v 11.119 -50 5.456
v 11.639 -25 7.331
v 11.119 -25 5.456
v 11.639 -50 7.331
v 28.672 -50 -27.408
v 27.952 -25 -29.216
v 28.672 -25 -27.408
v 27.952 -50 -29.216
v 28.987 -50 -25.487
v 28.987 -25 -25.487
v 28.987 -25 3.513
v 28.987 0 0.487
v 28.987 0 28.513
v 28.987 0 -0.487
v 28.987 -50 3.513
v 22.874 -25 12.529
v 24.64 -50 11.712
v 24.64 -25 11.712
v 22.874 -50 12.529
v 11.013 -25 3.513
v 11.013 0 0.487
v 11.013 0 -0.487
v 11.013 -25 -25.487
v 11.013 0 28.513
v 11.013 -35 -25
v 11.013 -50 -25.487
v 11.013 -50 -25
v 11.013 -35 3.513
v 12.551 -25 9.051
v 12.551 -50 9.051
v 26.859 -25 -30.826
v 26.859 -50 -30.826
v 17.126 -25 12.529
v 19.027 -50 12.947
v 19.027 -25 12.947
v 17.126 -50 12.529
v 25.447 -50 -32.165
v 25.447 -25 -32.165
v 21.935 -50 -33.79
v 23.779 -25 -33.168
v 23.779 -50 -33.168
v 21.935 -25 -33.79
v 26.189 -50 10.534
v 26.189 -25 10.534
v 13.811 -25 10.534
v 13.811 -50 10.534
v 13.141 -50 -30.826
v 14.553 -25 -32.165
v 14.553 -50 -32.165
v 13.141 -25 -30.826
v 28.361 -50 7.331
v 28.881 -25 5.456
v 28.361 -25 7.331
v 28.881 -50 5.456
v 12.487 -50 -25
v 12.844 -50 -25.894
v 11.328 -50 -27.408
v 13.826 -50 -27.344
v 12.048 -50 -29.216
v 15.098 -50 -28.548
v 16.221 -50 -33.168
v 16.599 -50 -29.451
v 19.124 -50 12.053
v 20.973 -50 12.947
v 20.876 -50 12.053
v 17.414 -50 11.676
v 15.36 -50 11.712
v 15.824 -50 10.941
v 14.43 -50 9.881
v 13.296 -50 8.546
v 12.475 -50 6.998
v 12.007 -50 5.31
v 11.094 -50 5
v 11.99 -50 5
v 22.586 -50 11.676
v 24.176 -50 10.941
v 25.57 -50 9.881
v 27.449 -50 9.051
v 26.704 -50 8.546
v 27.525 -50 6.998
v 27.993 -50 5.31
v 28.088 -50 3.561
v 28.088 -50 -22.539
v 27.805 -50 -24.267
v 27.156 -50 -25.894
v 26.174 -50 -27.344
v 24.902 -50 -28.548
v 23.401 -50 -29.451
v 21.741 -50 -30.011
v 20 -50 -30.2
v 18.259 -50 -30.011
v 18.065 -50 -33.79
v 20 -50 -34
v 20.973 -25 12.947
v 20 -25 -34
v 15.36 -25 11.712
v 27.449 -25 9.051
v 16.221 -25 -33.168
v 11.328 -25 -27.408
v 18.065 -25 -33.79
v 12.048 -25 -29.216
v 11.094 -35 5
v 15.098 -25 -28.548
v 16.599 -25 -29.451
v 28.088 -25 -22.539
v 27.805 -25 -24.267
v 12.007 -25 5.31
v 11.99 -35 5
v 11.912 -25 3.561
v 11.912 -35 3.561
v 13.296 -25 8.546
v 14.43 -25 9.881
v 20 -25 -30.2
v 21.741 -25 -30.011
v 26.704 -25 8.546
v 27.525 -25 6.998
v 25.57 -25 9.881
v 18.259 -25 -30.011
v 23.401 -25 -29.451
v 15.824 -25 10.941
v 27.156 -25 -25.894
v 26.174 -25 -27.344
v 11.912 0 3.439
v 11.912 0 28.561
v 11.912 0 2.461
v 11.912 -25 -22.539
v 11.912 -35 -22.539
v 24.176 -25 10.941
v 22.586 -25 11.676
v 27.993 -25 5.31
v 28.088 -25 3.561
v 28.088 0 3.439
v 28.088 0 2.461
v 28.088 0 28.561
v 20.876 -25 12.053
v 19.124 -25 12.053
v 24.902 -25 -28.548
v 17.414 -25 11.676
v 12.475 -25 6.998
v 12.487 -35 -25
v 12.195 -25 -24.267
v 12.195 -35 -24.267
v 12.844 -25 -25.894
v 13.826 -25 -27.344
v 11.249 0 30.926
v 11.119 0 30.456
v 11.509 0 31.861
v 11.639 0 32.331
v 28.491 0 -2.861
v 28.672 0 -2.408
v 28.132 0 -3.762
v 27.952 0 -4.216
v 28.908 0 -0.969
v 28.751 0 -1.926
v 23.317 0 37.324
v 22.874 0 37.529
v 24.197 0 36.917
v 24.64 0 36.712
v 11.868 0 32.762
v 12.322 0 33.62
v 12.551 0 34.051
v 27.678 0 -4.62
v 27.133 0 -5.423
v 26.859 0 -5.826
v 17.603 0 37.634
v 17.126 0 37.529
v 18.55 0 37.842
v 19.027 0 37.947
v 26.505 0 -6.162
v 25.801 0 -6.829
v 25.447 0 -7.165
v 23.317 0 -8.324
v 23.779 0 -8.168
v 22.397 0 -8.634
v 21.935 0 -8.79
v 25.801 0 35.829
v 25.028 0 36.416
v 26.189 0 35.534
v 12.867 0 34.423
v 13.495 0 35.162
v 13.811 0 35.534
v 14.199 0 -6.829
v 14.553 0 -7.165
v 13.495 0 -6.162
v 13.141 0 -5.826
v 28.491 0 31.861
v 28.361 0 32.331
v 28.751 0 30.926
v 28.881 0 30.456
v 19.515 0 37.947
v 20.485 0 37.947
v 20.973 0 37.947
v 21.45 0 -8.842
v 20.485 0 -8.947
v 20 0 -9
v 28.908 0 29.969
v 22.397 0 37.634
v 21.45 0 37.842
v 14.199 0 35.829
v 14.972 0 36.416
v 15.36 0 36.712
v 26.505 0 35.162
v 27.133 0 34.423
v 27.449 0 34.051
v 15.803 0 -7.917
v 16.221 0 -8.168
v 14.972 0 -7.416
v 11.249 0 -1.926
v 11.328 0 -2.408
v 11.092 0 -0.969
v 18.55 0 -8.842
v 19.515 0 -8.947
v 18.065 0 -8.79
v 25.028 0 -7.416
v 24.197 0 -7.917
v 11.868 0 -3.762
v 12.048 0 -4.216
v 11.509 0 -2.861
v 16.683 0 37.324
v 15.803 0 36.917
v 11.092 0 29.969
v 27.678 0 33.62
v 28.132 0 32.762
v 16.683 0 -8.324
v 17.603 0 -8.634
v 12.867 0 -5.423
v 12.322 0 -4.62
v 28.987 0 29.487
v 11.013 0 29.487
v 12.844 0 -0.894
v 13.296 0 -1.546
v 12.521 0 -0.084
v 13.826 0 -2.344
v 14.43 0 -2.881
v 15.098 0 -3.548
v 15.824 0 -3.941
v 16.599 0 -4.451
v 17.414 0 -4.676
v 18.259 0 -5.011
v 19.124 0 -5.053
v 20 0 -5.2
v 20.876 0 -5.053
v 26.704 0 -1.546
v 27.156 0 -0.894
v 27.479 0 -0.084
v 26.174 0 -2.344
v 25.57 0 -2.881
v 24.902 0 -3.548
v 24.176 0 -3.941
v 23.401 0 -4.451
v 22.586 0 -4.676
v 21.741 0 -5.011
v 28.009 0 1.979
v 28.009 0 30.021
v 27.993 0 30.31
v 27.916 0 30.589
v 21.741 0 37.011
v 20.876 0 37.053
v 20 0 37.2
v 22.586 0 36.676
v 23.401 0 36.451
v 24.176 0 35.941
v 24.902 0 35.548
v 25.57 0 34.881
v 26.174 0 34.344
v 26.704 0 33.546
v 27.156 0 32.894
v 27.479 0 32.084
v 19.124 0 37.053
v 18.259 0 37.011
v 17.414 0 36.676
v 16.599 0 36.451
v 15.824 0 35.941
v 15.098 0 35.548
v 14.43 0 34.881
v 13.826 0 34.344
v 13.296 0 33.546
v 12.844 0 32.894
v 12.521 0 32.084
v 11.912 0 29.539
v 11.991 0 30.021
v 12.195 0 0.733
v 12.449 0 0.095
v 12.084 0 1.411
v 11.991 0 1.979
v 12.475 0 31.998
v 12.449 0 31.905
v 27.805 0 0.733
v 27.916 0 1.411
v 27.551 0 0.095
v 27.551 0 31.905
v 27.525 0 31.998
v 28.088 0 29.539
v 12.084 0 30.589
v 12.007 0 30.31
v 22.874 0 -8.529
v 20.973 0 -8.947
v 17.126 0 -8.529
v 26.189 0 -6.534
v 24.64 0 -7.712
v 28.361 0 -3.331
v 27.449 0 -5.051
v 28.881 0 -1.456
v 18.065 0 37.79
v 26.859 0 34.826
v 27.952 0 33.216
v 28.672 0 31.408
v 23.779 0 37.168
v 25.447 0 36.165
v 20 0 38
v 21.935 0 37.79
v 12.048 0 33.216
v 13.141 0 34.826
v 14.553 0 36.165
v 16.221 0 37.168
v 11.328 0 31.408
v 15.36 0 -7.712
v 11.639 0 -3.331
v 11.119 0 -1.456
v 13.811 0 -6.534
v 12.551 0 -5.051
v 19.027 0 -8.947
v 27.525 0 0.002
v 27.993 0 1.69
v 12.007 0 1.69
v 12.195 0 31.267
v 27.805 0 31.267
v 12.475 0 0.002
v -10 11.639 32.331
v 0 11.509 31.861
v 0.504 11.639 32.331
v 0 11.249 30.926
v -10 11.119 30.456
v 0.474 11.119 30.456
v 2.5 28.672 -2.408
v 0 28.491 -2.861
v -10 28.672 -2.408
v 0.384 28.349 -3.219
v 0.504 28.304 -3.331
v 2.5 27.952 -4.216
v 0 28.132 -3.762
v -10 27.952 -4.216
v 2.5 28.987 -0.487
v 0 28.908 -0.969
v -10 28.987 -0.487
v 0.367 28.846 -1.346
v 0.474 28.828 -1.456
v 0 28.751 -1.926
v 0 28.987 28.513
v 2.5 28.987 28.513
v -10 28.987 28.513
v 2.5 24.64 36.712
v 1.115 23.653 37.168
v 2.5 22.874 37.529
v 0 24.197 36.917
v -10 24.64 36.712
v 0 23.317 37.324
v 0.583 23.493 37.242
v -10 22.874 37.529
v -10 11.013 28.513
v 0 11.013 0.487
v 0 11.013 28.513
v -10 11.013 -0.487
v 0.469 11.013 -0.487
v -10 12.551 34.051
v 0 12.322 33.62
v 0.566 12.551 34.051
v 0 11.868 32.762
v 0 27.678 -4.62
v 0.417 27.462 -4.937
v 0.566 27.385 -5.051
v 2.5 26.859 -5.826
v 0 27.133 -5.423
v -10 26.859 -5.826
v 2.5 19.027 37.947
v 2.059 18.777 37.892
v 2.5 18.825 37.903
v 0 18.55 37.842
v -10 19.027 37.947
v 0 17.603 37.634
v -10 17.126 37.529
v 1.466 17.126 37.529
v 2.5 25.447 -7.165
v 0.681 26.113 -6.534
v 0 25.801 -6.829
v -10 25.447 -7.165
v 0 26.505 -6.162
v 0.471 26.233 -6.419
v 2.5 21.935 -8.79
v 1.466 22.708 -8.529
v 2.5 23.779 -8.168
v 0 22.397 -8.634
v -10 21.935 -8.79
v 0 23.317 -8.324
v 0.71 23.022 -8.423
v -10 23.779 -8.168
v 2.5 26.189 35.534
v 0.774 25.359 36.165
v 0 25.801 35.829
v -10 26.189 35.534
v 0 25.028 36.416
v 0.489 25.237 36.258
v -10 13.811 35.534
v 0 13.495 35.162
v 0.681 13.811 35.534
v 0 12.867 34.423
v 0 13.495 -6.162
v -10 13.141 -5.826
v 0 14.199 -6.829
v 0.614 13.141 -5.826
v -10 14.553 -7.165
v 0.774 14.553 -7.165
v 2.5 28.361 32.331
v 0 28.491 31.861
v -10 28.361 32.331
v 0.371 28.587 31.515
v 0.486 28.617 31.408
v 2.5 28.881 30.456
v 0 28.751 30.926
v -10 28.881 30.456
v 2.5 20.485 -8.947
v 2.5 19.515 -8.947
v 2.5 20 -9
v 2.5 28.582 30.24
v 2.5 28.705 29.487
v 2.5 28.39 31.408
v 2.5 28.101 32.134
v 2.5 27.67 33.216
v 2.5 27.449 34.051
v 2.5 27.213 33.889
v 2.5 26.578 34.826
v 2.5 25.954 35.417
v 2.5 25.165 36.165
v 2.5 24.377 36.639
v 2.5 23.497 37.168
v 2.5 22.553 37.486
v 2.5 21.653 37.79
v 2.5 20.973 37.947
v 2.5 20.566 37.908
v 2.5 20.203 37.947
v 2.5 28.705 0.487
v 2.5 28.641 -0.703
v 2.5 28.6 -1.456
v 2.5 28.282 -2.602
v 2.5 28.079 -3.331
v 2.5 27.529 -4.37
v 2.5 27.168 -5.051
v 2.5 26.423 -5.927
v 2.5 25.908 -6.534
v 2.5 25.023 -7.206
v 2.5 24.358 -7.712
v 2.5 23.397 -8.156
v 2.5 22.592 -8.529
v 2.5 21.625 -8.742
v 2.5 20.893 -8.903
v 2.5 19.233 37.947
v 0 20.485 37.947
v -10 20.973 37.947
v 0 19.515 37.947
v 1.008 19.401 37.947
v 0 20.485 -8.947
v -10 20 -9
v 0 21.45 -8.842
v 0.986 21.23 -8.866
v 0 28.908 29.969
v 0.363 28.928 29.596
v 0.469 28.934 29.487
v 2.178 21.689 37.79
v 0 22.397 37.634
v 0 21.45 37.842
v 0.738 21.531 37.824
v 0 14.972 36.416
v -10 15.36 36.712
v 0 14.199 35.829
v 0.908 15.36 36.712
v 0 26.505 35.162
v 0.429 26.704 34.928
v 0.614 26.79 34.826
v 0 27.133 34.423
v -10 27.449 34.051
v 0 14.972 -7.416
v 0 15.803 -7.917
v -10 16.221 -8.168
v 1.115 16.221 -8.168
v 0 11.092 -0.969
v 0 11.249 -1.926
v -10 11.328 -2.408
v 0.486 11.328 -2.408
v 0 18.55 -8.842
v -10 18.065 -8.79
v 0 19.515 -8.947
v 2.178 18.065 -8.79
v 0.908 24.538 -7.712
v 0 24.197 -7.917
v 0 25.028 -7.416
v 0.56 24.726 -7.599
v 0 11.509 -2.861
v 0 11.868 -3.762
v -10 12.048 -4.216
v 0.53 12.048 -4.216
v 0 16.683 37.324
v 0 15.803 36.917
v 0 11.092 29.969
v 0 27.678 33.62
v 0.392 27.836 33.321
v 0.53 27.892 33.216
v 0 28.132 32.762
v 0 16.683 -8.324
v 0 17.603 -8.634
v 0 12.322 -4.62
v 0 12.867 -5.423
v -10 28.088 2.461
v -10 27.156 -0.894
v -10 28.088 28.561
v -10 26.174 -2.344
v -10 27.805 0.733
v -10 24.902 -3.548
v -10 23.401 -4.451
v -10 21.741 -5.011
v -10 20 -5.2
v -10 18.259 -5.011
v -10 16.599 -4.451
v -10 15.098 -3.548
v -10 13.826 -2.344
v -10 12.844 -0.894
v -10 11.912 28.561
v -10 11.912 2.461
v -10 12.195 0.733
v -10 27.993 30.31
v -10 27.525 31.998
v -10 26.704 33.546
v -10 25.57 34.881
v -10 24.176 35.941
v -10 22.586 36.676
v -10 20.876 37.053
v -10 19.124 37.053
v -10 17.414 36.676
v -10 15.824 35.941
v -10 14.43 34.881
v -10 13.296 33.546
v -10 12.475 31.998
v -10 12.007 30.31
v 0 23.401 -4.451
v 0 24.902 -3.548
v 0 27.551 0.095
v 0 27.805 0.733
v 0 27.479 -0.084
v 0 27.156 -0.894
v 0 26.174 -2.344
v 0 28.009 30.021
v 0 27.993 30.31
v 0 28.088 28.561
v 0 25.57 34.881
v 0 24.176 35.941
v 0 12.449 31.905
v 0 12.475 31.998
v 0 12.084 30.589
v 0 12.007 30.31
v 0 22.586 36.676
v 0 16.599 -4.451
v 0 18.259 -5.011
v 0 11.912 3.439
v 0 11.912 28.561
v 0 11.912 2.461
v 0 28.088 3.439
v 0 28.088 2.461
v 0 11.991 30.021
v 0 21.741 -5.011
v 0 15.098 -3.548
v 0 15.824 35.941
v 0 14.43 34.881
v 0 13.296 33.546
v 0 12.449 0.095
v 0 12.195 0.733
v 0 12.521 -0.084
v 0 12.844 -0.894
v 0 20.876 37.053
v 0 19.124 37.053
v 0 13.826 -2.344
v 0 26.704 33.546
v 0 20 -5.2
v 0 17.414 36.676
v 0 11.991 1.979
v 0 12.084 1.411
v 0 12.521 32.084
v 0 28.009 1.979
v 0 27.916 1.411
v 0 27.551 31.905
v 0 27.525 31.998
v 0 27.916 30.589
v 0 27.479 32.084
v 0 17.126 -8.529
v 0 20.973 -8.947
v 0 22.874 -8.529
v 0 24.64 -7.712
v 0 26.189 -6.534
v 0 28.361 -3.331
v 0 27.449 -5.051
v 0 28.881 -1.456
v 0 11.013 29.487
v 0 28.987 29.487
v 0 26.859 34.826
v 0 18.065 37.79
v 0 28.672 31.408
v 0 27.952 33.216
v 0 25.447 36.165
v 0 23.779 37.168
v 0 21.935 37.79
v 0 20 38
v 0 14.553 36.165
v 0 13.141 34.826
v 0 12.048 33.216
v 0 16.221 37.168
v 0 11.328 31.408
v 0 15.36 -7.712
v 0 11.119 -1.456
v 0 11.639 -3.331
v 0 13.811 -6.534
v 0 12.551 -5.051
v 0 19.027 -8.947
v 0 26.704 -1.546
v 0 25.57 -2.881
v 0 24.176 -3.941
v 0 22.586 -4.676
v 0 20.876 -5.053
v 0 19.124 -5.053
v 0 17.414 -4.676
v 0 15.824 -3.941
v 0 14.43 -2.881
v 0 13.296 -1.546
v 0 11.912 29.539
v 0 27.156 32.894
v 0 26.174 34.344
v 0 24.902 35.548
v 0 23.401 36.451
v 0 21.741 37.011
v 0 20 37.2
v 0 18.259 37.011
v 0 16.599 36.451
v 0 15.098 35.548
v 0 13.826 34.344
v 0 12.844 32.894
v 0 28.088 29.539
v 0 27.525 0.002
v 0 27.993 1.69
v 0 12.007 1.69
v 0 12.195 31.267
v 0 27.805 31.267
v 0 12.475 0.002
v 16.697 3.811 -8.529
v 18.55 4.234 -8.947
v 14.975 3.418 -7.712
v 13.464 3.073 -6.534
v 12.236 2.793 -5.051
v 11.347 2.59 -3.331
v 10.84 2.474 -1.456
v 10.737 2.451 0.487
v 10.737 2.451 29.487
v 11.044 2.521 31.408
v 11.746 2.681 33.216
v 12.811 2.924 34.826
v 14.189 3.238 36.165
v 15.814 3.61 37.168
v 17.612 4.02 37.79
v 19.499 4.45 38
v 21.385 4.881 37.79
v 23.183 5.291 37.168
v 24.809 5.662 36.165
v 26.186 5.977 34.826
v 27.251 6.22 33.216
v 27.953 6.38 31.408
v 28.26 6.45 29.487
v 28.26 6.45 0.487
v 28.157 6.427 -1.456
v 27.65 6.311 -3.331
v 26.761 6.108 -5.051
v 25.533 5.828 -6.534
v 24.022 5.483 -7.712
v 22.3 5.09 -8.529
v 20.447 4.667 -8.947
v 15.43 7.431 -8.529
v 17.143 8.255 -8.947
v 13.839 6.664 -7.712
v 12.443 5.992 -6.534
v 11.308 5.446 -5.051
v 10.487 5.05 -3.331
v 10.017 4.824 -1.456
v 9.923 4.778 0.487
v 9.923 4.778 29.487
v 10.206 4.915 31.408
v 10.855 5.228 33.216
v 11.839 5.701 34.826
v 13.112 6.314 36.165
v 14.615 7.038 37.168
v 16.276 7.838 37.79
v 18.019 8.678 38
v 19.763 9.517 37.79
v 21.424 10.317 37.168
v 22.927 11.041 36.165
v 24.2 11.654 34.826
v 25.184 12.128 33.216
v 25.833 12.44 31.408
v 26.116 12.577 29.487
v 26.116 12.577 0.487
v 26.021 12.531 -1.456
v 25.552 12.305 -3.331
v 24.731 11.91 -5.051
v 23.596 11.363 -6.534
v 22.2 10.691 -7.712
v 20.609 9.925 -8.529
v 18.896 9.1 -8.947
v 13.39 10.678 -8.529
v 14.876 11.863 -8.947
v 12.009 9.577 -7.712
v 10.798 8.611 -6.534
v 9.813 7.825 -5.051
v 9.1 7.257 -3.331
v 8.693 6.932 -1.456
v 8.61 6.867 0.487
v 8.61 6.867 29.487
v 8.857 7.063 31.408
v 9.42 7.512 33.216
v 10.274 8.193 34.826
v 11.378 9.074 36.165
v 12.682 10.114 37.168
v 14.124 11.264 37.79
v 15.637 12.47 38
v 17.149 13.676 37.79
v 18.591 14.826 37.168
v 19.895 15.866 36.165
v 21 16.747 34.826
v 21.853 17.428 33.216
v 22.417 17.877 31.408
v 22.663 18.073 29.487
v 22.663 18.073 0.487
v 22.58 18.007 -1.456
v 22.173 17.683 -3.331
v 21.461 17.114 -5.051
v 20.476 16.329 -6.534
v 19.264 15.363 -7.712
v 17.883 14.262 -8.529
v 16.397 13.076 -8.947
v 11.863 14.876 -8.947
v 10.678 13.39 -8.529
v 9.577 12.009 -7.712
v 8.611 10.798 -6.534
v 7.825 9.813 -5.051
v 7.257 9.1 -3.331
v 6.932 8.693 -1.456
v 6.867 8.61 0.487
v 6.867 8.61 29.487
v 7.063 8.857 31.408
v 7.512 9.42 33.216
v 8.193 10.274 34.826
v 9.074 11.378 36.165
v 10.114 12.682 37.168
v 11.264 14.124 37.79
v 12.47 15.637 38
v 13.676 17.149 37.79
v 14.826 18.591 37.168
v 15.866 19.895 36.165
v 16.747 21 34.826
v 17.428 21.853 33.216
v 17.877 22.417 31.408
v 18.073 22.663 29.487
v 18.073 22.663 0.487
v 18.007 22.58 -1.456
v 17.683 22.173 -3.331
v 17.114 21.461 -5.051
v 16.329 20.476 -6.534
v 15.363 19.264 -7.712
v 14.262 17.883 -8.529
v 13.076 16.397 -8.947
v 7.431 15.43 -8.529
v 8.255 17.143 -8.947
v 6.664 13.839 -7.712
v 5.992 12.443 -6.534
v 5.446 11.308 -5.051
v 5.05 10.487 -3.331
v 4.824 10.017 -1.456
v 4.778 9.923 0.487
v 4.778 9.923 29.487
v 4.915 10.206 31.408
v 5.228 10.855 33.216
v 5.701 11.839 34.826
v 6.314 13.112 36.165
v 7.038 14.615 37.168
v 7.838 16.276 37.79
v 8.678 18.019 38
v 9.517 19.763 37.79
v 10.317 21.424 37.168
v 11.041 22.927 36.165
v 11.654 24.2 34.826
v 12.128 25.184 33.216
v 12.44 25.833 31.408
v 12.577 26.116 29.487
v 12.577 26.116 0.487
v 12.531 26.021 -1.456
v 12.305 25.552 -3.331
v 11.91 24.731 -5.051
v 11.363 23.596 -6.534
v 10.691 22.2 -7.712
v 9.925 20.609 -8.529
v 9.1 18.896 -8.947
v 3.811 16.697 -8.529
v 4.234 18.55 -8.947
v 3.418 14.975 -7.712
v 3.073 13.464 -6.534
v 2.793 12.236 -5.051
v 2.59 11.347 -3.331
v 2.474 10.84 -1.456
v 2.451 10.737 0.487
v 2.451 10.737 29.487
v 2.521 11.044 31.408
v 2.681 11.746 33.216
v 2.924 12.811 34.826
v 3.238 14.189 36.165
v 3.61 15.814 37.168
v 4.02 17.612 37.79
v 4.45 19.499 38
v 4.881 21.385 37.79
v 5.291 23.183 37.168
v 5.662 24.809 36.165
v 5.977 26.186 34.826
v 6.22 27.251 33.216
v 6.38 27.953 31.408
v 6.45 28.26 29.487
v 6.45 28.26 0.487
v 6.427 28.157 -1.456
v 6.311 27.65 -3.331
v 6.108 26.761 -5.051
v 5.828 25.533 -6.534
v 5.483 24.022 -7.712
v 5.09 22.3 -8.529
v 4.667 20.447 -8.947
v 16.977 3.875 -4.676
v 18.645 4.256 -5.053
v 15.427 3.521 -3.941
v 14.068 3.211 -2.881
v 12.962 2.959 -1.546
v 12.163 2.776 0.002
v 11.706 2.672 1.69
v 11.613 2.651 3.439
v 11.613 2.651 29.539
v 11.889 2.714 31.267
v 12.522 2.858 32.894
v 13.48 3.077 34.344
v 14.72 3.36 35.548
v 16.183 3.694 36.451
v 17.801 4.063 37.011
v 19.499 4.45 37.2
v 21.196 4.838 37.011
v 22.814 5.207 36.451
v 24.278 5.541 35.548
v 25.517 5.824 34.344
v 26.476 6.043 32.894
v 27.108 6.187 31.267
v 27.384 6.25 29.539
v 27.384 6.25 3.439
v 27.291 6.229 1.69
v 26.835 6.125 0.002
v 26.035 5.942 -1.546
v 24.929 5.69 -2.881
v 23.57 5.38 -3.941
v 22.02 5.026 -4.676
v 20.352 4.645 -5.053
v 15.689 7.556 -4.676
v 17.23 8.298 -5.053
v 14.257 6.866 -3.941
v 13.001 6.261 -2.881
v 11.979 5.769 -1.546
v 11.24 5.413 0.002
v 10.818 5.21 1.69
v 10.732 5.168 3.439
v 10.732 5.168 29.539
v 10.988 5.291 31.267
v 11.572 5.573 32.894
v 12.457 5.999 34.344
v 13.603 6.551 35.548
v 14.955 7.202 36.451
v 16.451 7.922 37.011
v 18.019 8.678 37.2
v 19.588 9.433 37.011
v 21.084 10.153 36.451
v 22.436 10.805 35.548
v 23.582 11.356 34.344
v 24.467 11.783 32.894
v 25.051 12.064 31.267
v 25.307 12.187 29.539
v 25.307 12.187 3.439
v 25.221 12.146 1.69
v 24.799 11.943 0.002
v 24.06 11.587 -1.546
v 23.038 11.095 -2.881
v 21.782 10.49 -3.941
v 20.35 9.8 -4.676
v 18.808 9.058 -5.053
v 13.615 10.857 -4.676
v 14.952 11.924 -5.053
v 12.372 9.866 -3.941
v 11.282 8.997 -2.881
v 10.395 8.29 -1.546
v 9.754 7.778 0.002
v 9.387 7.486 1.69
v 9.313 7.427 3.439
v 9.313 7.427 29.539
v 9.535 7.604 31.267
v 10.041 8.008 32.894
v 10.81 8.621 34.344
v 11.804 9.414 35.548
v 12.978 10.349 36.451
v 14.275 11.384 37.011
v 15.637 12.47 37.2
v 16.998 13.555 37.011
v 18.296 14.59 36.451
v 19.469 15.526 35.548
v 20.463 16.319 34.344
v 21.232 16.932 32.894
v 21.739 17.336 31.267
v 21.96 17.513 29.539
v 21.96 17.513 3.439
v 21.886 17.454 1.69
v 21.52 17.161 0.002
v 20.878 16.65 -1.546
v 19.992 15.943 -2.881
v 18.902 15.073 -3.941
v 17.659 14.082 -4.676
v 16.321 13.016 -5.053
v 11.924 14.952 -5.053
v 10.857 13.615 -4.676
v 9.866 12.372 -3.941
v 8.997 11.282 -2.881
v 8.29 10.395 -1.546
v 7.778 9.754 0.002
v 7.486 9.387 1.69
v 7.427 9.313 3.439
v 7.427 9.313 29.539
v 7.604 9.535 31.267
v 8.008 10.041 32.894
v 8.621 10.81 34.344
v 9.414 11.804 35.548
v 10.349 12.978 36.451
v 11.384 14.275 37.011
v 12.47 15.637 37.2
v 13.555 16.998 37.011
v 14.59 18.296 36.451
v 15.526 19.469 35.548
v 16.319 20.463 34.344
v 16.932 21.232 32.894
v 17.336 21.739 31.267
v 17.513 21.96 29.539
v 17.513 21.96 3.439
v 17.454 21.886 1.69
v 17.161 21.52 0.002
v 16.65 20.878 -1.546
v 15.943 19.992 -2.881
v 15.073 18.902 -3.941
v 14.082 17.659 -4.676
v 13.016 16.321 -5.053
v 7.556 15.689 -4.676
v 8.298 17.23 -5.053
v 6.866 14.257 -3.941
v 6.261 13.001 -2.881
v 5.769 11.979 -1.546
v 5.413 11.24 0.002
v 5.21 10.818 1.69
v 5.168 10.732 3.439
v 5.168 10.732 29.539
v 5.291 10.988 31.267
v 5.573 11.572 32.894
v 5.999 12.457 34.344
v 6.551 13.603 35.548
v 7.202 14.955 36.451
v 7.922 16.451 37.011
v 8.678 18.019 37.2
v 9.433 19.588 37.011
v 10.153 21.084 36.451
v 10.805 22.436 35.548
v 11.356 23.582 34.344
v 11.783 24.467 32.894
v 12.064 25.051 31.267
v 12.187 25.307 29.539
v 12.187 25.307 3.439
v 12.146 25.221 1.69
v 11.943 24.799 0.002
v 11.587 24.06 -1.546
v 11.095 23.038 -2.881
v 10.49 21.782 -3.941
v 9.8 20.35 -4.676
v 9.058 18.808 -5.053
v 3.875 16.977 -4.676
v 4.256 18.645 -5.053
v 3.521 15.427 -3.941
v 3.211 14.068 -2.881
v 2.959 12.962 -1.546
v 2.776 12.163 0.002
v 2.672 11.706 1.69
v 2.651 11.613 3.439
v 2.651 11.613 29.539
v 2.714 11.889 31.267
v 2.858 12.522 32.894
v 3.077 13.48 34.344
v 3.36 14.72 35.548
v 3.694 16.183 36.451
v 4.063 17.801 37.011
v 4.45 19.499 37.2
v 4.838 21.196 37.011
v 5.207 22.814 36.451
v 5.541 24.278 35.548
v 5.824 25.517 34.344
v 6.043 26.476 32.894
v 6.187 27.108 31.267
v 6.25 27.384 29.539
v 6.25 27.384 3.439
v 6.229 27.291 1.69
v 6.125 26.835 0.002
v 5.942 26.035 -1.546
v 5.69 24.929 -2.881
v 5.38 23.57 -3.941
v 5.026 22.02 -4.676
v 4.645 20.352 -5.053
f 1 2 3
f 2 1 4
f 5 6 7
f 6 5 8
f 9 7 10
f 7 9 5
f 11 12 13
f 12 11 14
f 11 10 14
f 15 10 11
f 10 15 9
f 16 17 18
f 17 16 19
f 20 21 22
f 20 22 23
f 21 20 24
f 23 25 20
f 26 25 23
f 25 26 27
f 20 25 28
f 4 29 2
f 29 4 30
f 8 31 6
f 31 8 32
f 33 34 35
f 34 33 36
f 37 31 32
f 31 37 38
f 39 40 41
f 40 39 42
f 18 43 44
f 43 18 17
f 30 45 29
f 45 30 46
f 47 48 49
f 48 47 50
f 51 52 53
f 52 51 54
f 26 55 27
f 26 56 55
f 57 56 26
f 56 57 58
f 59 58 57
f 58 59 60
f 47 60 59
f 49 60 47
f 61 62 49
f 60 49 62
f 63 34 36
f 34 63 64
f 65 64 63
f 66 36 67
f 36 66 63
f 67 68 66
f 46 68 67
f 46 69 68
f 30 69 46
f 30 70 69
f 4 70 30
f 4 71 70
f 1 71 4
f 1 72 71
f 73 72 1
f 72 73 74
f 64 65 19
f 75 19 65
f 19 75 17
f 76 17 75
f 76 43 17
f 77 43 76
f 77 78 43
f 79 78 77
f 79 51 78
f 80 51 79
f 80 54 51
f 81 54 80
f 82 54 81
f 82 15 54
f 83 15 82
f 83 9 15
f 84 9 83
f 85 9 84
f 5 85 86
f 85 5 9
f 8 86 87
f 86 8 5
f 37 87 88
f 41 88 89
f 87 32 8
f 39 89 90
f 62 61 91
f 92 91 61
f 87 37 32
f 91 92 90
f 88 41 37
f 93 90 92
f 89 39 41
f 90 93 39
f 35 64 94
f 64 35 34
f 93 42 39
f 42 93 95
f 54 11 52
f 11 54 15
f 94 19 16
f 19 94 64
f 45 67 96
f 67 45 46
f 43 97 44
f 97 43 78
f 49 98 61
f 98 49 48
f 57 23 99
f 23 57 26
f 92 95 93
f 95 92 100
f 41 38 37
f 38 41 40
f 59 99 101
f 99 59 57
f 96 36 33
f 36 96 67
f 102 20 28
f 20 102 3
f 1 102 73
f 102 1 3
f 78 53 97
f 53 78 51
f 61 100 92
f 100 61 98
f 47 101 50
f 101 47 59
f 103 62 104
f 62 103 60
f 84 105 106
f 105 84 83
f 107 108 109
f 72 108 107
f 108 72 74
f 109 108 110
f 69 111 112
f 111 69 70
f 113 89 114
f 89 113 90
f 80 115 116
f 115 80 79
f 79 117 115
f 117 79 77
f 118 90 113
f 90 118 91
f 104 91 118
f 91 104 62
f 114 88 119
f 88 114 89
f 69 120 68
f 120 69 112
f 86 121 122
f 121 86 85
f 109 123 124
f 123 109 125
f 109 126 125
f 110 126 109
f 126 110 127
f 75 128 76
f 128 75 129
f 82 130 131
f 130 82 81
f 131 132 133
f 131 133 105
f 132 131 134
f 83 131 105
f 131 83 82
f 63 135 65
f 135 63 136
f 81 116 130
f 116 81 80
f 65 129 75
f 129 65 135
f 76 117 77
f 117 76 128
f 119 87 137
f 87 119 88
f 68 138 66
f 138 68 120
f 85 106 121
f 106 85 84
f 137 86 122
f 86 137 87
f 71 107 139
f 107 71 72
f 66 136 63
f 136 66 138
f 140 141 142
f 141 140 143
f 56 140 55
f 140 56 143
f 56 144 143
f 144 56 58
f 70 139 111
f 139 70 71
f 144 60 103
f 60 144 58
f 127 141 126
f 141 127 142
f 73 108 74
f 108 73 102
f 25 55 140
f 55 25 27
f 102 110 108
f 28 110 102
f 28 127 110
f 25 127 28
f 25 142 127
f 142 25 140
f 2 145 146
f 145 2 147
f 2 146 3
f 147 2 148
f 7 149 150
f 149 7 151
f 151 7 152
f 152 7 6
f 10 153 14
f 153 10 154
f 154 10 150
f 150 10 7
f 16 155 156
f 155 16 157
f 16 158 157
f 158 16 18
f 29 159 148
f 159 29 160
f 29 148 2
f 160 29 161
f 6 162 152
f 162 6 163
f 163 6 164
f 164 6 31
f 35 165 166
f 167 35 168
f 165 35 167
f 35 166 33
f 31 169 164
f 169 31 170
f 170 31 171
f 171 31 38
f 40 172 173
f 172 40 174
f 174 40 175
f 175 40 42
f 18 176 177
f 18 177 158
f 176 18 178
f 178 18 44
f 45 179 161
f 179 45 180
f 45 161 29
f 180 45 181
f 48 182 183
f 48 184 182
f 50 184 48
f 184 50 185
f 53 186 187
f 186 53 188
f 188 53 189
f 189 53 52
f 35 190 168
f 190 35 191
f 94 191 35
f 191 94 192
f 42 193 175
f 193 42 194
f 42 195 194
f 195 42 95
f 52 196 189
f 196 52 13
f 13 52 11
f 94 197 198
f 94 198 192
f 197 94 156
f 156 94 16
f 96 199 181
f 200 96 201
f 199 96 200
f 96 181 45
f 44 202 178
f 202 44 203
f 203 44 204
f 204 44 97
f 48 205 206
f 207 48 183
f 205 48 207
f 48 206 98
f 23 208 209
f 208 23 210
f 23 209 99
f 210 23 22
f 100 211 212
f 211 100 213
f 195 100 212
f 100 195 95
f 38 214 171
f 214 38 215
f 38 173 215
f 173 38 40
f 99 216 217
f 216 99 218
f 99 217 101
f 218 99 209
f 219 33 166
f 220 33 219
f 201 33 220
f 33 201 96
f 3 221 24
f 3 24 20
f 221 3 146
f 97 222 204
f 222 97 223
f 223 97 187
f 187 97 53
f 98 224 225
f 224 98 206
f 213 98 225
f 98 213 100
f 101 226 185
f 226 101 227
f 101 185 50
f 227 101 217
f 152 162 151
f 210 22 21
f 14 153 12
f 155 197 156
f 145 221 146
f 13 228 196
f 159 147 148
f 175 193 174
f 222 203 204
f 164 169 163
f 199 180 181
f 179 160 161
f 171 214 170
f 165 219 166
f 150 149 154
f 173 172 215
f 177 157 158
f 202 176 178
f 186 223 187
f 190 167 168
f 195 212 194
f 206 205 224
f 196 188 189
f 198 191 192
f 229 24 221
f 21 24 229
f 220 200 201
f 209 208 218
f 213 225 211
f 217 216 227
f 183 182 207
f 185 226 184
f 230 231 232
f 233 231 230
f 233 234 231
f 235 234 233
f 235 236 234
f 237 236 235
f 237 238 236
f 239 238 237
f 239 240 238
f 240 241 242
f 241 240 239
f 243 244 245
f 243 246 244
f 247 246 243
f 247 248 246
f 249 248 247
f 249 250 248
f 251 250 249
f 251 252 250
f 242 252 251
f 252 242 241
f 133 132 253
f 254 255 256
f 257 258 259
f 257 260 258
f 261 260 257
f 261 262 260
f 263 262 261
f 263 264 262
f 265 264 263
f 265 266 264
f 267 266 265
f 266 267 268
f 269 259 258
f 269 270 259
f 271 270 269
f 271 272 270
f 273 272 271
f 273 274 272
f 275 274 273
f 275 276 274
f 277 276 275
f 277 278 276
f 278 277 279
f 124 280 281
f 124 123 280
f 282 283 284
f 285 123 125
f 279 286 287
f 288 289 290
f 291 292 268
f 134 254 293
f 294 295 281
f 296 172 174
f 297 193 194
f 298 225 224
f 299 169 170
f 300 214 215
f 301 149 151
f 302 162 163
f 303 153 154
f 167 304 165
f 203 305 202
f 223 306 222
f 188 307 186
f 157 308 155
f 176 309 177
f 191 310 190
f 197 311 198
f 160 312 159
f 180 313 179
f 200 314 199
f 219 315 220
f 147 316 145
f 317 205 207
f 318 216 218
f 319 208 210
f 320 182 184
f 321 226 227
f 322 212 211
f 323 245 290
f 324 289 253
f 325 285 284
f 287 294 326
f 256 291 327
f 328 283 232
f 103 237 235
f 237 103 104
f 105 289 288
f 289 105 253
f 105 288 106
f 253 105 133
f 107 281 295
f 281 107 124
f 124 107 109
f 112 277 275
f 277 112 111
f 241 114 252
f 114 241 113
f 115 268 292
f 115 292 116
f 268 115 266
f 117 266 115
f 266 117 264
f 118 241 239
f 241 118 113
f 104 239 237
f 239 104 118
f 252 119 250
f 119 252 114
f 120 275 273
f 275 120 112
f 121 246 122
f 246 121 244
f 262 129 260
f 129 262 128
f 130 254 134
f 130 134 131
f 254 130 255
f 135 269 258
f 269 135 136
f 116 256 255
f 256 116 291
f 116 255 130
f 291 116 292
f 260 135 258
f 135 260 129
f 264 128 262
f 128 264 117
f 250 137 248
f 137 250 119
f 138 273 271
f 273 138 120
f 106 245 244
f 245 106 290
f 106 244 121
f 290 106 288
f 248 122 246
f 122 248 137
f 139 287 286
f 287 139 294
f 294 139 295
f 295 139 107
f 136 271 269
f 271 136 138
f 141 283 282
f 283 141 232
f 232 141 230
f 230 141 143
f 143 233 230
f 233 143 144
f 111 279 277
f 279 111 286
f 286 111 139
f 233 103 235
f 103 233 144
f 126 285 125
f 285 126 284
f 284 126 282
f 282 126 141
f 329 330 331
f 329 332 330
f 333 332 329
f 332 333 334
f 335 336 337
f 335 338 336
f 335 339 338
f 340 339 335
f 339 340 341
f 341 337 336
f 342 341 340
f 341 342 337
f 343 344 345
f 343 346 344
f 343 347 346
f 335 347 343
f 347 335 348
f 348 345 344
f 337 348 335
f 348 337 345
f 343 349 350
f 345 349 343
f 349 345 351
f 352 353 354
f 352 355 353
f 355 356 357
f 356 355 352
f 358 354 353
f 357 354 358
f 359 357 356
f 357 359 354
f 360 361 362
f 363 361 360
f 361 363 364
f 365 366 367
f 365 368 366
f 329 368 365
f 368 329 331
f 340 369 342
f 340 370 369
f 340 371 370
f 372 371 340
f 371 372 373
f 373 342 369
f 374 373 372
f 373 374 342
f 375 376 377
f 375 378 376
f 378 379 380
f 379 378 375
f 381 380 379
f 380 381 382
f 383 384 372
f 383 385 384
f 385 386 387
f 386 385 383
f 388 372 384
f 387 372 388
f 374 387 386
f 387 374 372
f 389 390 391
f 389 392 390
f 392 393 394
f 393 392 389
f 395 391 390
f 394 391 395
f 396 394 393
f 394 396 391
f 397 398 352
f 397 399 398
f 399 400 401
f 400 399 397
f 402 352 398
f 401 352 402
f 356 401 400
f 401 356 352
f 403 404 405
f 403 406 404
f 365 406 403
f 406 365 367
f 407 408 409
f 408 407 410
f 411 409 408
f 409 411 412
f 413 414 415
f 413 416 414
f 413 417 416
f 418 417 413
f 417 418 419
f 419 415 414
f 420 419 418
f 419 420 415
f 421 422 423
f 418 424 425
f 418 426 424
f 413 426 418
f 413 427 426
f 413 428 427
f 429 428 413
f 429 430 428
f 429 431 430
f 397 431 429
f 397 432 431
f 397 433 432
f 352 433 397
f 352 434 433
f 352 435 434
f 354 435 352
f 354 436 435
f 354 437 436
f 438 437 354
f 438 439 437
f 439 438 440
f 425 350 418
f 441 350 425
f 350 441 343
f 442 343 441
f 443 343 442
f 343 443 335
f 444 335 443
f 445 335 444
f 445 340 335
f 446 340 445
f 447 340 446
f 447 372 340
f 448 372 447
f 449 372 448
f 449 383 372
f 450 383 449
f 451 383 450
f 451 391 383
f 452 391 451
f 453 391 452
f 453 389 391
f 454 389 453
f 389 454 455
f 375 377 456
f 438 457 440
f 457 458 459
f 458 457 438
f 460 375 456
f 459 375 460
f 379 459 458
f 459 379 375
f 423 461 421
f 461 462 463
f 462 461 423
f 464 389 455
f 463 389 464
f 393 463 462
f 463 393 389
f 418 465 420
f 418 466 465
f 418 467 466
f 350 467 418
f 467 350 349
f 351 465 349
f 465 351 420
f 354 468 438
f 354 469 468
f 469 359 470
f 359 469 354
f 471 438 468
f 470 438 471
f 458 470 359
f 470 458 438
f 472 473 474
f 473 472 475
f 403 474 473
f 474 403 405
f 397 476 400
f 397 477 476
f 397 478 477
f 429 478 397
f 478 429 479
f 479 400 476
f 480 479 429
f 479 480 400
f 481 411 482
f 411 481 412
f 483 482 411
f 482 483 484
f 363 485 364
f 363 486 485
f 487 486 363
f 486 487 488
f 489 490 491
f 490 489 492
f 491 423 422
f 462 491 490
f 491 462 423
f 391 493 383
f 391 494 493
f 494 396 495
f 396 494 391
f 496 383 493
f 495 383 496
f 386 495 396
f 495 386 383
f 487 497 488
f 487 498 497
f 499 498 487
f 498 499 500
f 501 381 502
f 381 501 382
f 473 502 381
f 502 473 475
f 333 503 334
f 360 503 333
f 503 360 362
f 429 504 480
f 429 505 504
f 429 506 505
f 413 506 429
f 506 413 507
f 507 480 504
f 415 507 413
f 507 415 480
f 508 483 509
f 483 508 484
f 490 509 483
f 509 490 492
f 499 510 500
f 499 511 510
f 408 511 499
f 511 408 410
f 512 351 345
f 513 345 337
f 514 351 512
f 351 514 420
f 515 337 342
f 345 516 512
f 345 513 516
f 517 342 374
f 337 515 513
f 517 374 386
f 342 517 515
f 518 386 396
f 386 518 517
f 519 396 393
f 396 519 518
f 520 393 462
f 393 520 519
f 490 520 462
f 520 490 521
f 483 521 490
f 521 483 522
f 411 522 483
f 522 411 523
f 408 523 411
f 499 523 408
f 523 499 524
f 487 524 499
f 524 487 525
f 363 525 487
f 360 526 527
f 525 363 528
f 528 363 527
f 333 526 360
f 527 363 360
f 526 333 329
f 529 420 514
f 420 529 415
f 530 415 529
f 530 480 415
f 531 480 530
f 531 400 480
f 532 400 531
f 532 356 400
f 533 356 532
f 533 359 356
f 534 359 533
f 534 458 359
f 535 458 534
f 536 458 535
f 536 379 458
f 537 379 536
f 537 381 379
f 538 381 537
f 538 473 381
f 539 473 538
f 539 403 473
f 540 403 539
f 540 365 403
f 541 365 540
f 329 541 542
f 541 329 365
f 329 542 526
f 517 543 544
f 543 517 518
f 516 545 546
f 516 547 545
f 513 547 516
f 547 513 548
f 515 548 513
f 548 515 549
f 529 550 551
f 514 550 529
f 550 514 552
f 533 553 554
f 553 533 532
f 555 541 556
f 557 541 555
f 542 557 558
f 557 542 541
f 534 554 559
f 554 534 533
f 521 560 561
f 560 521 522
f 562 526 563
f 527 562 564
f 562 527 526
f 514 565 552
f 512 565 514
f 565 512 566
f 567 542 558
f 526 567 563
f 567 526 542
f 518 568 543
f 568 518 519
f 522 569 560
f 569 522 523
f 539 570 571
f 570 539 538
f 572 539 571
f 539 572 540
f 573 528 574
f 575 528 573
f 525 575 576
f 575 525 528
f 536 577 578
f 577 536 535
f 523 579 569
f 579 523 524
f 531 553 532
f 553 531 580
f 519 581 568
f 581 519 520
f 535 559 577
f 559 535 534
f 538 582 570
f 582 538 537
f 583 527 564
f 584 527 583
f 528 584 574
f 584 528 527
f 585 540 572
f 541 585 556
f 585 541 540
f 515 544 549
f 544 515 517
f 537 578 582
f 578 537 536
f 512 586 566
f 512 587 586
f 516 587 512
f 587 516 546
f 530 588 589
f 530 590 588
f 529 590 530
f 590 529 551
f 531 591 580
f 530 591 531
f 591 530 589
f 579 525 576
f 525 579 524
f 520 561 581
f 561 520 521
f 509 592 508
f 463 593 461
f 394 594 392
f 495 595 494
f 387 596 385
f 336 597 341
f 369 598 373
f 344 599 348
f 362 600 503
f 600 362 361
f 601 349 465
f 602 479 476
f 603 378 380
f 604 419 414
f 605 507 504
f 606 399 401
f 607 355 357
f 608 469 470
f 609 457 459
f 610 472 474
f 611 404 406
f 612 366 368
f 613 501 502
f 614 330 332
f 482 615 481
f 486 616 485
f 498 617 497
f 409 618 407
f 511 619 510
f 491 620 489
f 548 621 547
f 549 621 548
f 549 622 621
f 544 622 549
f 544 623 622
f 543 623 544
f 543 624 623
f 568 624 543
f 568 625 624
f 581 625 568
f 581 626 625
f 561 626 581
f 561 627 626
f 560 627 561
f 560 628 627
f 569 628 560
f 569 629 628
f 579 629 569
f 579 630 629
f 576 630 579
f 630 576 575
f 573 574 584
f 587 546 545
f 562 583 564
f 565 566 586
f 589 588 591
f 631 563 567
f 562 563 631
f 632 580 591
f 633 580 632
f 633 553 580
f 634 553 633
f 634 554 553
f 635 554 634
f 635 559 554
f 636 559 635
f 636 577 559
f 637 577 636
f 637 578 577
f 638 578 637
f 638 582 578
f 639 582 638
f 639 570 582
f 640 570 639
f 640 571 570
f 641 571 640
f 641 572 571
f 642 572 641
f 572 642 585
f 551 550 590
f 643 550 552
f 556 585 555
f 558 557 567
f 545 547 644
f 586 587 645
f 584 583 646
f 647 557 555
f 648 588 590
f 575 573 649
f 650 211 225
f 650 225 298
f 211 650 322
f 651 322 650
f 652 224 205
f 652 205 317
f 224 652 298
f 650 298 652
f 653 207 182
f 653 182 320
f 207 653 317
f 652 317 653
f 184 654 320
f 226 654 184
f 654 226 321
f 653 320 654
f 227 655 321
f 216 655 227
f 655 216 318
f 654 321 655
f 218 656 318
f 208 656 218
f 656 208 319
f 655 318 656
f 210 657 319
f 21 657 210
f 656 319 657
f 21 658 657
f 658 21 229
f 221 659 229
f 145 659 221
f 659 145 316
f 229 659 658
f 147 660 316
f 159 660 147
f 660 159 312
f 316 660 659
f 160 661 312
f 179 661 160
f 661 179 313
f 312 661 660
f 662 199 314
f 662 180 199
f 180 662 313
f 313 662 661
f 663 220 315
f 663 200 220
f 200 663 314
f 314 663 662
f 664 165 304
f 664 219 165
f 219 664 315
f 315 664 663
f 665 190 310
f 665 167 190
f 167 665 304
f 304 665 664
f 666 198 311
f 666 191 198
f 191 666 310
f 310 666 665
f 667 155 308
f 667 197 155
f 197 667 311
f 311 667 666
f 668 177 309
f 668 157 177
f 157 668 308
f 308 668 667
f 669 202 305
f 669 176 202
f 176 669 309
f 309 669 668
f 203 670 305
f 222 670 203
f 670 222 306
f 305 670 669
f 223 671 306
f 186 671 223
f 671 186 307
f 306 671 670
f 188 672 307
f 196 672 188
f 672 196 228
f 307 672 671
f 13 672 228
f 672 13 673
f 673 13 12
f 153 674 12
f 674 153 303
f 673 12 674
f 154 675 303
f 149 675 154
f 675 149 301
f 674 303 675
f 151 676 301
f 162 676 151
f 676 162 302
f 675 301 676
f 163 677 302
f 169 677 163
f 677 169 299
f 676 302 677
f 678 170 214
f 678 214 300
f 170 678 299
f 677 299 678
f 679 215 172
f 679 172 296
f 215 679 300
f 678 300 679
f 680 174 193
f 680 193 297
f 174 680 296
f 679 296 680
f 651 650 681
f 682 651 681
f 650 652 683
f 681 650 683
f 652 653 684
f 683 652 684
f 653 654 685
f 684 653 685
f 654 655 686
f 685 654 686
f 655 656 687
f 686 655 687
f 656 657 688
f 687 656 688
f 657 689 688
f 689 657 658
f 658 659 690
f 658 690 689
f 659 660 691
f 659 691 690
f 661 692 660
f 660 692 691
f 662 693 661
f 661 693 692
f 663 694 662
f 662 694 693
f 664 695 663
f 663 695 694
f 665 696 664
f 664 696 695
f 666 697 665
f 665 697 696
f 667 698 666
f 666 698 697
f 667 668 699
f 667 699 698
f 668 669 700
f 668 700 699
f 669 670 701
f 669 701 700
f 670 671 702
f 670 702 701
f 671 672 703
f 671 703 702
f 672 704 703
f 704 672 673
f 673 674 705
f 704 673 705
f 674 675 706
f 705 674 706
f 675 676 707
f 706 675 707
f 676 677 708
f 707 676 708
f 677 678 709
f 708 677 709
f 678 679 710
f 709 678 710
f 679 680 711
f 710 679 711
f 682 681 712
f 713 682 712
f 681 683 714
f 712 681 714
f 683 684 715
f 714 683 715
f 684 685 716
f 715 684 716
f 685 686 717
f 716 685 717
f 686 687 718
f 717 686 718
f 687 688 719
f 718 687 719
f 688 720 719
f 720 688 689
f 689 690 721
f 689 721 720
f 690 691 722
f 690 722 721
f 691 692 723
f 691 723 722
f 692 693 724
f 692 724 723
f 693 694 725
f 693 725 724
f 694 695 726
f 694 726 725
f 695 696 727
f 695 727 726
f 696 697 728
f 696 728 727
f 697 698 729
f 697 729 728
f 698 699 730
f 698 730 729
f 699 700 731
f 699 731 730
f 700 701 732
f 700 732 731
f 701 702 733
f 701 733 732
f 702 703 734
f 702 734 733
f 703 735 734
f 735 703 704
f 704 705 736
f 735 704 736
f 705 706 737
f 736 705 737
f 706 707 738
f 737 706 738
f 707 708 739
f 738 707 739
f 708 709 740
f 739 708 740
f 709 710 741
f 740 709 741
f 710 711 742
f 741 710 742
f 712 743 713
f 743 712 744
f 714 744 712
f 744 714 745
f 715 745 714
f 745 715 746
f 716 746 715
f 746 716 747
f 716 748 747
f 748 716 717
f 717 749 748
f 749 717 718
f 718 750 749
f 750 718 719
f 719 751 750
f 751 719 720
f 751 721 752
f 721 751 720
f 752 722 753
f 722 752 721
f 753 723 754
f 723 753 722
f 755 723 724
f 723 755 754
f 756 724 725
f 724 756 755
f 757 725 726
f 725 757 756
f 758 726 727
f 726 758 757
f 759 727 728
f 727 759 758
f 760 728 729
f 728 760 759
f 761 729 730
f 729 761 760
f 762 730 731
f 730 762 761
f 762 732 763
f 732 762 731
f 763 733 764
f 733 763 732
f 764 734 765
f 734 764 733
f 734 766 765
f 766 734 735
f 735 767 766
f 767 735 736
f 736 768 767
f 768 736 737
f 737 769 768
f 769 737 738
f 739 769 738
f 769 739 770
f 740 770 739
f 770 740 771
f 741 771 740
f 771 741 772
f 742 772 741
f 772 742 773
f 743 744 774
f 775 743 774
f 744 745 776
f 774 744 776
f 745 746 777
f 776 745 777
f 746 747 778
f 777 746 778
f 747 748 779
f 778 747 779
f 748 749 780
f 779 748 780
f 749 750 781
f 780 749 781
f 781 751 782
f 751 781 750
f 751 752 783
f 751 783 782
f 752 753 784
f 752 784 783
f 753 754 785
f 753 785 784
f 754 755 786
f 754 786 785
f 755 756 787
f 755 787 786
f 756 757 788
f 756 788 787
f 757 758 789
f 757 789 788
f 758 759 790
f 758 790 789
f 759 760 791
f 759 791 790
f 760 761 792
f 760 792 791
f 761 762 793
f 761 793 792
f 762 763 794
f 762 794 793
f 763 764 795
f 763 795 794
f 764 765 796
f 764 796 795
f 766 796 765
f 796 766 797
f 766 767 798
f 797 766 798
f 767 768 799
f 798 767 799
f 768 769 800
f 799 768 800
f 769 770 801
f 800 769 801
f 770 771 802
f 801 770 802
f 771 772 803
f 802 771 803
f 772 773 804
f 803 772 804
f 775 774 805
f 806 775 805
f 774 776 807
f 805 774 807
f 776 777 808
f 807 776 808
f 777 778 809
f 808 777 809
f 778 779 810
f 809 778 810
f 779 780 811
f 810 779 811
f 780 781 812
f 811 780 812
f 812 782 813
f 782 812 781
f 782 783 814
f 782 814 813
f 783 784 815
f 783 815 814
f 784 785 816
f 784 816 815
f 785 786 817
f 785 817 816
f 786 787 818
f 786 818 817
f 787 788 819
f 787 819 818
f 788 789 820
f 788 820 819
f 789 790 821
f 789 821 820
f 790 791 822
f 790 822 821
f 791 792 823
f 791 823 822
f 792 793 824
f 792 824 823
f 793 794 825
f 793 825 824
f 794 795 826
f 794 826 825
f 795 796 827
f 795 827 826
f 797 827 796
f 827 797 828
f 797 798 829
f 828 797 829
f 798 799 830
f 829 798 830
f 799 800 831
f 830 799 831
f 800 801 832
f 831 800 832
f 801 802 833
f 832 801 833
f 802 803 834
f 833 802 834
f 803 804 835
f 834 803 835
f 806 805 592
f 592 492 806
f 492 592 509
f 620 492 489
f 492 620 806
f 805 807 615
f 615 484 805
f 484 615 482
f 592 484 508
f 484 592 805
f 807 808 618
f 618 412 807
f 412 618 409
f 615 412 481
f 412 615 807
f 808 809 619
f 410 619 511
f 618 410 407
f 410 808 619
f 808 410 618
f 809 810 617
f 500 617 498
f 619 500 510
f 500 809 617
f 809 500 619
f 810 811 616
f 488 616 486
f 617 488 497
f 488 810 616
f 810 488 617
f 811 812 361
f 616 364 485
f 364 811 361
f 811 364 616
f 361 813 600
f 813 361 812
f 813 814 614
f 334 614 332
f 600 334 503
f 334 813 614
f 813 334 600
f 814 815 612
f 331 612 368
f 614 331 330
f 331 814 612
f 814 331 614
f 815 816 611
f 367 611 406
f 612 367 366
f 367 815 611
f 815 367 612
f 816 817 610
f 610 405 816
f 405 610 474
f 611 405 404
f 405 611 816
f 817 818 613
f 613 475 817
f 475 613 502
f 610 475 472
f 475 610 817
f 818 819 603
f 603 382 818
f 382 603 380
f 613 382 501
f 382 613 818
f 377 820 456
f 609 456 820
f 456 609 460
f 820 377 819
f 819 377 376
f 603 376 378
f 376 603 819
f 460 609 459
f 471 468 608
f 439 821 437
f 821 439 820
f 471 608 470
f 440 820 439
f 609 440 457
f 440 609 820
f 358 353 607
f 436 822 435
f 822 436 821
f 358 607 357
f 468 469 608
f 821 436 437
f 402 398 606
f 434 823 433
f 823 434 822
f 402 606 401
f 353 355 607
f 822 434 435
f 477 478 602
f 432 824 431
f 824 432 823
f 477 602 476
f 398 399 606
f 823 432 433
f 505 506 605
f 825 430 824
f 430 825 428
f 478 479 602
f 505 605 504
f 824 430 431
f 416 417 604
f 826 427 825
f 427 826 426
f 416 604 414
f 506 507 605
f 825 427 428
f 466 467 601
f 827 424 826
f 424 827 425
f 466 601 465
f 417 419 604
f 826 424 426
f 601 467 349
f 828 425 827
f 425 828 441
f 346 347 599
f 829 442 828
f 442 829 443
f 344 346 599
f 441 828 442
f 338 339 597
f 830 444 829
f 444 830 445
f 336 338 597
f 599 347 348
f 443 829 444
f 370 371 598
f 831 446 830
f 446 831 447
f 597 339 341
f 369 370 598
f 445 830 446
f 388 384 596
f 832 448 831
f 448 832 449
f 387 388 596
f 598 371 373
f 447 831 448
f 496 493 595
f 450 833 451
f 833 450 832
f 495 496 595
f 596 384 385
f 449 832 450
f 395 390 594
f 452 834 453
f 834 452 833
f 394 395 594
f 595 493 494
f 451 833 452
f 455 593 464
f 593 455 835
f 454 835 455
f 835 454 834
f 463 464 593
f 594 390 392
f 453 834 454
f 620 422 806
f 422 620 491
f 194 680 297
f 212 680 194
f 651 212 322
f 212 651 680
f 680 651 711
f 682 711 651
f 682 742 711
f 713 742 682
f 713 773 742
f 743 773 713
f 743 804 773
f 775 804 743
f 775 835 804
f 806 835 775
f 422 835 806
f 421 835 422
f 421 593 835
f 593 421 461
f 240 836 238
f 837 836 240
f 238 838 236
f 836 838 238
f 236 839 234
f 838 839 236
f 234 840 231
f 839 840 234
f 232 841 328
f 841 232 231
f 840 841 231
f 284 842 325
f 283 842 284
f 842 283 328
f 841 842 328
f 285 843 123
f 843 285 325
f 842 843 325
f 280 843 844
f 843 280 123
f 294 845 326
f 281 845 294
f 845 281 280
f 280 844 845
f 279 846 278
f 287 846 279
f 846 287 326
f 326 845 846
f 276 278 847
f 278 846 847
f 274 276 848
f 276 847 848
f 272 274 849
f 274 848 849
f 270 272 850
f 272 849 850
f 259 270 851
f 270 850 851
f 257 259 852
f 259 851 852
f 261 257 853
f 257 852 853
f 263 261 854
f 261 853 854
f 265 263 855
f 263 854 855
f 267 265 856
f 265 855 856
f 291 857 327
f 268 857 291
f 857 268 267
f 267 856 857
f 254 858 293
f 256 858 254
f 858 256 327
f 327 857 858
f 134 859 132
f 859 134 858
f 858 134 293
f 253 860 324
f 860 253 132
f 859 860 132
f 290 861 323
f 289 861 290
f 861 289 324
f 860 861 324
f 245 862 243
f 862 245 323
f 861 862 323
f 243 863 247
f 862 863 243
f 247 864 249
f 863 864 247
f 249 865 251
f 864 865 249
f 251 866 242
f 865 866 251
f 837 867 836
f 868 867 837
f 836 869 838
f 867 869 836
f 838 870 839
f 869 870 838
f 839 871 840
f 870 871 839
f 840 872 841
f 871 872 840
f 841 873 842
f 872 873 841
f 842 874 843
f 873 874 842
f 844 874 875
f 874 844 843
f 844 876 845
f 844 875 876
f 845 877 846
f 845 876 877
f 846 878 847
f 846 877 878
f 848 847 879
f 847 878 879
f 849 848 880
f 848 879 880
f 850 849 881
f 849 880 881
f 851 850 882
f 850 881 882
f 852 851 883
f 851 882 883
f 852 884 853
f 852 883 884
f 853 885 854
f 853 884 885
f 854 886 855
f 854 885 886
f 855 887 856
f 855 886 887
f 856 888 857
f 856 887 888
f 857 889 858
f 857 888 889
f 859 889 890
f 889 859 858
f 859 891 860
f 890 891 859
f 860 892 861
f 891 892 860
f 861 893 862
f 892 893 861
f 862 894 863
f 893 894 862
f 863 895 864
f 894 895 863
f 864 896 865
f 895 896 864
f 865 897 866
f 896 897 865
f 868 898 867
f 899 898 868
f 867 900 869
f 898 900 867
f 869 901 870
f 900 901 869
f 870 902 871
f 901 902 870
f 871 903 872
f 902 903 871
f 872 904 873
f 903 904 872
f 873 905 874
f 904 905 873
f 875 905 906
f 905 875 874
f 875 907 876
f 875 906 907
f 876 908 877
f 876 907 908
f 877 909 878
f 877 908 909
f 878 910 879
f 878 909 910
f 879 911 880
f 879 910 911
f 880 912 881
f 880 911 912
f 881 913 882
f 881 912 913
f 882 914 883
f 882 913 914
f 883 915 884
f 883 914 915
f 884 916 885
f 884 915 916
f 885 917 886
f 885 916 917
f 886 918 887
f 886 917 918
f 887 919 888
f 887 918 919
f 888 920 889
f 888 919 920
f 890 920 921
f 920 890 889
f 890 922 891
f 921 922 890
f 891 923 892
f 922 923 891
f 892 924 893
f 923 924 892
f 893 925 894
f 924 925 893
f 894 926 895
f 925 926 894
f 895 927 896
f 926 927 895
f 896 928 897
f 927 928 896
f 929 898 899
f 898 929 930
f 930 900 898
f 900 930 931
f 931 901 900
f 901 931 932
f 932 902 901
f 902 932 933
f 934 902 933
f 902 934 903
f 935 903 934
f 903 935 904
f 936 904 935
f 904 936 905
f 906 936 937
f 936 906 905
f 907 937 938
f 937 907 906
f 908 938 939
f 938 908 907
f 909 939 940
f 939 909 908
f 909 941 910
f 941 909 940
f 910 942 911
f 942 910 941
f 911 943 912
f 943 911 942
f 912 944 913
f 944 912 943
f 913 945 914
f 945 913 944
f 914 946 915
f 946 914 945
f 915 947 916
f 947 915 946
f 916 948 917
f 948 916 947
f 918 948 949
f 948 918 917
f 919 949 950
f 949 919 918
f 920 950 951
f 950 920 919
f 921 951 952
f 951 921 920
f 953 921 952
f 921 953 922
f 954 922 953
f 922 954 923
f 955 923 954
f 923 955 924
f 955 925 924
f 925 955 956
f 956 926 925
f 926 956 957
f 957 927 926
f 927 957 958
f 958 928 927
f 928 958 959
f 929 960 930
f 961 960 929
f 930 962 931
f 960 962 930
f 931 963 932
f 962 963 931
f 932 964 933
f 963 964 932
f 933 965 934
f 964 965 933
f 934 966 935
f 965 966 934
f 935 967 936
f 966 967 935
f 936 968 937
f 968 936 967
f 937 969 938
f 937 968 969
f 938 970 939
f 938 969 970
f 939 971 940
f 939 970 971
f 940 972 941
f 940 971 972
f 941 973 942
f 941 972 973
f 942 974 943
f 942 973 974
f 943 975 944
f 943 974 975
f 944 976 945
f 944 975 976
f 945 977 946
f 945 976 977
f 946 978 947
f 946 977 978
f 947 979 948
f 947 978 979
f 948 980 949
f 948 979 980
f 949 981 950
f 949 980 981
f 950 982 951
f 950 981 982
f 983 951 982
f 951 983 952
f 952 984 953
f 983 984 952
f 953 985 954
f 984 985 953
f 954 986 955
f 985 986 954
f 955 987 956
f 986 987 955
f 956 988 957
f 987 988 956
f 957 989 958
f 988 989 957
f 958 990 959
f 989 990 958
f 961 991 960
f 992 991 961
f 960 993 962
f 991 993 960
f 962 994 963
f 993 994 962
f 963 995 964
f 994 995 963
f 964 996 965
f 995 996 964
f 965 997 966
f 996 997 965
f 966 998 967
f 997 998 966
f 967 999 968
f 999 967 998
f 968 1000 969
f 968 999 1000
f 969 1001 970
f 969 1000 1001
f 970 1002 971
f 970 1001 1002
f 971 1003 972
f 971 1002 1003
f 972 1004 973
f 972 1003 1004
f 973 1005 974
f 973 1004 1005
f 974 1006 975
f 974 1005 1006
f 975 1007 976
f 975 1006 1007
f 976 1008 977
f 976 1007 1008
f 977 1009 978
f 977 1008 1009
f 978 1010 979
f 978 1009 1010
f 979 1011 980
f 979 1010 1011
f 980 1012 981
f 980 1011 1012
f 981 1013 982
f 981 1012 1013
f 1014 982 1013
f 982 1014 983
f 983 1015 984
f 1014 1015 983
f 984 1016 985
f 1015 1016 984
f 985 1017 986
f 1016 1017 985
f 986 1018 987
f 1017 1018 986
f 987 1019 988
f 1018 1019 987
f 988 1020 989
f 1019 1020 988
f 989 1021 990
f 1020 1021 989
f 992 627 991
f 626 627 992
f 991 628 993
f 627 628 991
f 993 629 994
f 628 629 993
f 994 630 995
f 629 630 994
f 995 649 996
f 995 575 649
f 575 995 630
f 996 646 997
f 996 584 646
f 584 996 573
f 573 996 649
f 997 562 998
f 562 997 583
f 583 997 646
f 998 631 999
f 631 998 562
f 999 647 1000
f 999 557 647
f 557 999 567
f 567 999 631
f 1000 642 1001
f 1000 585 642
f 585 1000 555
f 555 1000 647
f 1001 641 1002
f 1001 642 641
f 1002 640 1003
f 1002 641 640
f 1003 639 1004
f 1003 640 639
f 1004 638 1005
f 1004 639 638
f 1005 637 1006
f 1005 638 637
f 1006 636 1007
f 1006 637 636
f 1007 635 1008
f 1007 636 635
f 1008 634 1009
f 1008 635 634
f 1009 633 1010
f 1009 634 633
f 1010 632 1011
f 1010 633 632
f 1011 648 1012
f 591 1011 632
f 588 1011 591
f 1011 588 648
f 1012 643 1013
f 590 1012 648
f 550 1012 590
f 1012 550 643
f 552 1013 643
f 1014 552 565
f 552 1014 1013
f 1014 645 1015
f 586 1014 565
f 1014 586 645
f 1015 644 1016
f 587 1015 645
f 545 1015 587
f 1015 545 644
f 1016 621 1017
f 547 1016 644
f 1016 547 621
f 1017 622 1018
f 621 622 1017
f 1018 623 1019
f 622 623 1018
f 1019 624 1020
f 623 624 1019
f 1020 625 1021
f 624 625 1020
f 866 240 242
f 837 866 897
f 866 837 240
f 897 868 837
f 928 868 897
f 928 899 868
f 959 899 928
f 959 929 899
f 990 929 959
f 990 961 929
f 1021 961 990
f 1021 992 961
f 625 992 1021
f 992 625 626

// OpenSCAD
jheight = 25;
jradius = 9;
lwidth = 29;

module topplug(){
  hull(){
    circle(jradius);
    translate([lwidth, 0, 0]){
      circle(jradius);
    }
  }
}

module cplug(jh = jheight){
  difference(){
    hull(){
      cylinder(jh, jradius, jradius);
      translate([lwidth, 0, 0]){
        cylinder(jh, jradius, jradius);
      }
    }
    scale([0.9, 0.9, 1]){
      hull(){
        cylinder(jh, jradius, jradius);
        translate([lwidth, 0, 0]){
          cylinder(jh, jradius, jradius);
        }
      }
    }
  }
}

module shearAlongX(p) {
  multmatrix([
    [1, 0, 0, 0],
    [p.y / p.x, 1, 0, 0],
    [p.z / p.x, 0, 1, 0]
  ]) children();
}

module shearAlongY(p) {
  multmatrix([
    [1, p.x / p.y, 0, 0],
    [0, 1, 0, 0],
    [0, p.z / p.y, 1, 0]
  ]) children();
}

module shearAlongZ(p) {
  multmatrix([
    [1, 0, p.x / p.z, 0],
    [0, 1, p.y / p.z, 0],
    [0, 0, 1, 0]
  ]) children();
}

difference(){
  union(){
    rotate_extrude(angle=90){
      translate([20, 0, 0]){
        rotate([0, 0, 90]){
          topplug();
        }
      }
    }

  // hollow vertical straightaway, without back
  difference(){  
      translate([20, -25, 4]){
        rotate([90, 90, 0]){
          cplug();
        }
      }
      // remove back of vertical straightaway
      translate([10, -50, -25]){
        cube([10, 15, 30]);
      }
  }
  
    // sheared joiner
    shearAlongY([0, -30, -30]){
      translate([20, 0, lwidth]){
        rotate([90, 90, 0]){
          cplug();
        }
      }  
    }

    // hollow horizontal straightaway  
    scale([1, 1, 1]){
      translate([-10, 20, lwidth]){
        rotate([0, 90, 0]){
          cplug(jheight / 2);
        }
      }
    }


  }


  // hollow out top bend  
  union(){
    rotate_extrude(angle=90){
      translate([20, 3, 0]){
        scale([0.9, 0.9, 0.9]){
          rotate([0, 0, 90]){
            topplug();
          }
        }
      }
    }
  }

}
